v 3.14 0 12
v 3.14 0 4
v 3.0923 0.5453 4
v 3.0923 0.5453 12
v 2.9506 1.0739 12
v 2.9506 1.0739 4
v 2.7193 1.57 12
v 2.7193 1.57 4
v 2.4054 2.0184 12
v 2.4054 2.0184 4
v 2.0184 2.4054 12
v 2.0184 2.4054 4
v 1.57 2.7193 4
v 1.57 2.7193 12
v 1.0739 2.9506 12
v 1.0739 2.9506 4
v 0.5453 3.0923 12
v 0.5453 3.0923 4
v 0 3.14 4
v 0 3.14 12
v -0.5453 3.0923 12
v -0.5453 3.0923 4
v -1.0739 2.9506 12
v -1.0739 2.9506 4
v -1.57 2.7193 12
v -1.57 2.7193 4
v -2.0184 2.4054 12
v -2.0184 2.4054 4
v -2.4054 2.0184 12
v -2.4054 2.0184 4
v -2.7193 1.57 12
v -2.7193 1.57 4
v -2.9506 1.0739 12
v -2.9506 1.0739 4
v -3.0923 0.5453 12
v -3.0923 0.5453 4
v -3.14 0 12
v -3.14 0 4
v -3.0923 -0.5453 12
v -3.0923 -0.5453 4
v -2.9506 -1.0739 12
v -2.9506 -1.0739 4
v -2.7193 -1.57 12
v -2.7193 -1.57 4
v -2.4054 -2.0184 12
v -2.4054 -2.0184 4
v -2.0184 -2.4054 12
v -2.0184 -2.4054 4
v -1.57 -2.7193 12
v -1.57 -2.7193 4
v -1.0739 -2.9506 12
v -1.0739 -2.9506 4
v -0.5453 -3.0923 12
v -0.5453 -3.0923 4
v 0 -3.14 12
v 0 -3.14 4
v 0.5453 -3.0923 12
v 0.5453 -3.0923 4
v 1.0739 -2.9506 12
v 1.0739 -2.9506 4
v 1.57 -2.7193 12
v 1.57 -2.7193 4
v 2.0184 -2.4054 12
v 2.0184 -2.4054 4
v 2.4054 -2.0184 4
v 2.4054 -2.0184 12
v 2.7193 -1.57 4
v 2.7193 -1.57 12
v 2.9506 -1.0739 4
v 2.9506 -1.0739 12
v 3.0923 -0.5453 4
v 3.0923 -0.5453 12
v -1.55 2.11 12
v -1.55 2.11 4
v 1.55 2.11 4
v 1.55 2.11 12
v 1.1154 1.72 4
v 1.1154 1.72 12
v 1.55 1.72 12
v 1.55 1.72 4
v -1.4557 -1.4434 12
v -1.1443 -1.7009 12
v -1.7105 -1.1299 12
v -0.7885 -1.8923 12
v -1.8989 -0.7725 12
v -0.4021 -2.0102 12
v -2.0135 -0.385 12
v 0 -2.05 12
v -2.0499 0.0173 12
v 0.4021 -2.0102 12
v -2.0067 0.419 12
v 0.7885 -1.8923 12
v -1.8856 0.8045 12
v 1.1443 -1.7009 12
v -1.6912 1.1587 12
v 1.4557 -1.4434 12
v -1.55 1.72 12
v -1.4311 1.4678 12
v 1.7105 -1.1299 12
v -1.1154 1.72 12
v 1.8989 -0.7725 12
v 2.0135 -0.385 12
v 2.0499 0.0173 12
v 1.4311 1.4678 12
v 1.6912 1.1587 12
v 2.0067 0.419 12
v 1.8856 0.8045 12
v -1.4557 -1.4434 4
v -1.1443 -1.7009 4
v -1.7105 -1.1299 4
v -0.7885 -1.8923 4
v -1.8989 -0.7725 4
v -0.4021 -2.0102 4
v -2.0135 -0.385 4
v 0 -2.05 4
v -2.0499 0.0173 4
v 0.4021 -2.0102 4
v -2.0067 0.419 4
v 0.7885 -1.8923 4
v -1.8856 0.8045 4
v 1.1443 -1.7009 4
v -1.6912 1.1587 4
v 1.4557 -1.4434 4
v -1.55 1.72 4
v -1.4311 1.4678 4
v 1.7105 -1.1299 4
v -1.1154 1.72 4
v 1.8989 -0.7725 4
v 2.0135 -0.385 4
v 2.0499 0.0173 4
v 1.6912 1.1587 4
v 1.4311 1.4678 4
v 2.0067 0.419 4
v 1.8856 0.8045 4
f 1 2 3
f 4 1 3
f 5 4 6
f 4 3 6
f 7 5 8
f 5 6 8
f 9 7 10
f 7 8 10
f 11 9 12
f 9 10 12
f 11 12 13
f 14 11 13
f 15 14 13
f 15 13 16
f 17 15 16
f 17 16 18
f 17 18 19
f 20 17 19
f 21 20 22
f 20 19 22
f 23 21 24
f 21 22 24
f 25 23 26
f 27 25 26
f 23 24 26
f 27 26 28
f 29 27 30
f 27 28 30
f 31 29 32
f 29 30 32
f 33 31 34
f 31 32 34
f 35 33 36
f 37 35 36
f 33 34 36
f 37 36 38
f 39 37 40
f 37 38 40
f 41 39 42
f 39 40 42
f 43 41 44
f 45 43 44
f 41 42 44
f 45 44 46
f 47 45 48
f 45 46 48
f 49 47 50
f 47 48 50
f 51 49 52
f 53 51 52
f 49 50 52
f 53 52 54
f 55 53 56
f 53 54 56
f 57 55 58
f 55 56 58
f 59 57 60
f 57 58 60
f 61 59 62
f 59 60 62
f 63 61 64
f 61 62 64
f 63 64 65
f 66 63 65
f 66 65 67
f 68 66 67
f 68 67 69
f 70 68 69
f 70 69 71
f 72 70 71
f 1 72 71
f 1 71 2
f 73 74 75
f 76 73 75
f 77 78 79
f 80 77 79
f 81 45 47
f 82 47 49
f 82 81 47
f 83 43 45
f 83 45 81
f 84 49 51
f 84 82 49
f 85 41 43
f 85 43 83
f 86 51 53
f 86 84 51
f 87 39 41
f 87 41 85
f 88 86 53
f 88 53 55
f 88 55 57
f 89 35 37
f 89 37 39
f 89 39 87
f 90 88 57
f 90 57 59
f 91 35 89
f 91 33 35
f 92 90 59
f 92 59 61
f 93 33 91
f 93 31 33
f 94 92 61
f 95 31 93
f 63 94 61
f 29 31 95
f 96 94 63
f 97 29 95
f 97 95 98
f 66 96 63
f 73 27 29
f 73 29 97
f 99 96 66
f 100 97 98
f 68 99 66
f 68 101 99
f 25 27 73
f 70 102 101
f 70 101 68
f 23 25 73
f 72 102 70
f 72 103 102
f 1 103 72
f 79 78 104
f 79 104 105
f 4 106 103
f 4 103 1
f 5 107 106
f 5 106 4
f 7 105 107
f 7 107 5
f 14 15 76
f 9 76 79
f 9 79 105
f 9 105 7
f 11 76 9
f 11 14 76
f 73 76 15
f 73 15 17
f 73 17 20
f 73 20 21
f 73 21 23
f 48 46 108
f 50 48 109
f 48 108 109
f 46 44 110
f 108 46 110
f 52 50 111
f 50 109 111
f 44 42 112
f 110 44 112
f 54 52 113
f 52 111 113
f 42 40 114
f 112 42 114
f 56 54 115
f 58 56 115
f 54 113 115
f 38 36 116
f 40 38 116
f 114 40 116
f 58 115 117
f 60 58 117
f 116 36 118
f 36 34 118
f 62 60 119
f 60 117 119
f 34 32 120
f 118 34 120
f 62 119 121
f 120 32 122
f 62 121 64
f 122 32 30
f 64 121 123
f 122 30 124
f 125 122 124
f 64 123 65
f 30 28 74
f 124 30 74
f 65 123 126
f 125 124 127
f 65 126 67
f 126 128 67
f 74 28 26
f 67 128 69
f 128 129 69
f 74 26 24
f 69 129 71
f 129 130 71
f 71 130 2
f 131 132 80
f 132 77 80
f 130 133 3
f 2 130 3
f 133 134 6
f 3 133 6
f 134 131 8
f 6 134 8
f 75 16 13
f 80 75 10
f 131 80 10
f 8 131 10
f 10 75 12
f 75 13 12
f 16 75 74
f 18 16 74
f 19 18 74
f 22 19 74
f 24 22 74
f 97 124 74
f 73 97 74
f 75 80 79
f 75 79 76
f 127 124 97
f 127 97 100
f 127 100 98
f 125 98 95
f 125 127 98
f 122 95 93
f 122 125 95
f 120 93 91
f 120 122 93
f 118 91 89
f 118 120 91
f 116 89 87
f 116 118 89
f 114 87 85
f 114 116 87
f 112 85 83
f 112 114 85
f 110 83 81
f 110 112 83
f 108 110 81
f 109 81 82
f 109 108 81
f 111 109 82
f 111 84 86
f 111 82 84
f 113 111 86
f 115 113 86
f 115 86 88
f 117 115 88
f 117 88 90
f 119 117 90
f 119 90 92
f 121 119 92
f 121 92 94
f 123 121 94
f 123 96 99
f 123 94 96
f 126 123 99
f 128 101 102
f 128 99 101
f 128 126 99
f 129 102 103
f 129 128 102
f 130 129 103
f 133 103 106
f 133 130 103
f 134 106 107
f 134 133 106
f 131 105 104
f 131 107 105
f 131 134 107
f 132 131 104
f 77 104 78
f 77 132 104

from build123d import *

# Parameters (mm, degrees)
CYLINDER002_R     = 3.14
CYLINDER002_DEPTH = 8
CYLINDER003_R     = 2.05
CYLINDER003_DEPTH = 14
BOX002_W          = 3.1
BOX002_H          = 0.39
BOX002_DEPTH      = 8.2


with BuildPart() as part:
    # Cylinder002 → Cylinder002 (join)
    with BuildSketch(Plane.XY.offset(4)):
        Circle(CYLINDER002_R)
    extrude(amount=CYLINDER002_DEPTH)

    # Cylinder003 → Cylinder003 (cut)
    with BuildSketch(Plane.XY.offset(3)):
        Circle(CYLINDER003_R)
    extrude(amount=CYLINDER003_DEPTH, mode=Mode.SUBTRACT)

    # Box002 → Box002 (cut)
    with BuildSketch(Plane(origin=(-1.55, 1.72, 3.9), x_dir=(1, 0, 0), z_dir=(0, 0, 1))):
        with Locations((1.55, 0.195)):
            Rectangle(BOX002_W, BOX002_H)
    extrude(amount=BOX002_DEPTH, mode=Mode.SUBTRACT)


solid = part.part
